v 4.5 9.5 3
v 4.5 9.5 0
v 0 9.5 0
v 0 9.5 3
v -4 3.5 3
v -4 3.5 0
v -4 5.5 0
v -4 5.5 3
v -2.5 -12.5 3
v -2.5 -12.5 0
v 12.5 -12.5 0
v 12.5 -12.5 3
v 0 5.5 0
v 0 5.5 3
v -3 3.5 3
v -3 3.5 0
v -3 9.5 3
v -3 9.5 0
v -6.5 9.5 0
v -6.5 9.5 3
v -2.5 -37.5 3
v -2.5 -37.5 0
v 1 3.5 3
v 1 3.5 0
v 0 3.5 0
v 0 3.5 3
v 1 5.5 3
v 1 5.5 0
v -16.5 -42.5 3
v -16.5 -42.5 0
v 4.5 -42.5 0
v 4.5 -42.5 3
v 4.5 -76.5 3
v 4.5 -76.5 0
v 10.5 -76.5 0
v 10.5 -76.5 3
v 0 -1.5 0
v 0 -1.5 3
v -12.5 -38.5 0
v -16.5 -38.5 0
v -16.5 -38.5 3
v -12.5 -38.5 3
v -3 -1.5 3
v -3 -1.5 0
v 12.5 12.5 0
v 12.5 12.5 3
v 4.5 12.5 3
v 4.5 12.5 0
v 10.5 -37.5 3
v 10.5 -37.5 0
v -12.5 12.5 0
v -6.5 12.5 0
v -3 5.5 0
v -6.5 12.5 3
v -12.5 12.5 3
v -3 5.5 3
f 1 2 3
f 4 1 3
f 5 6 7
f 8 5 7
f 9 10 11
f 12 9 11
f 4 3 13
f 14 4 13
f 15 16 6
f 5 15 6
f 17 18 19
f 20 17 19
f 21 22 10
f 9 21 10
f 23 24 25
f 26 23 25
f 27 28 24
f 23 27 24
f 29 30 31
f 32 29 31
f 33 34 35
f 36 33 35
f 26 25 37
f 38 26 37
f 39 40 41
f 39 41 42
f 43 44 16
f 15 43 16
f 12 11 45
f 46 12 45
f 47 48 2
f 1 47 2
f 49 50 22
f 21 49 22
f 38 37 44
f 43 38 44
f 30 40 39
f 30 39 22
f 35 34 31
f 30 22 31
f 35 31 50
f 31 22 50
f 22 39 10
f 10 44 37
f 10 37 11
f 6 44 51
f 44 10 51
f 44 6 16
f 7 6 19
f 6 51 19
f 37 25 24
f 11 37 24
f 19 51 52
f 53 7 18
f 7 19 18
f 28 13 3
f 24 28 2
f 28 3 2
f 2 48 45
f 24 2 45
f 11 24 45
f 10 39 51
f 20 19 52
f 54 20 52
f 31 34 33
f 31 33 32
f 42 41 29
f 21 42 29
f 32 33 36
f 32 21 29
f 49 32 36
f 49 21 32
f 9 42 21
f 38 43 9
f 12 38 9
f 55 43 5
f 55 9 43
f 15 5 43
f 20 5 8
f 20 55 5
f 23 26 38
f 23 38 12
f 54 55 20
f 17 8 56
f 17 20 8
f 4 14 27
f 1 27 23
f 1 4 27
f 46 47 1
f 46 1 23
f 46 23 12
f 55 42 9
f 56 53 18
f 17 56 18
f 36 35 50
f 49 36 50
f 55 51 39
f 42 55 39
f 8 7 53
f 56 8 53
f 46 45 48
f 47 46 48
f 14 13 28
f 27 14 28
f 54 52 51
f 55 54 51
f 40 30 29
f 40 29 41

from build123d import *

# Parameters (mm, degrees)
F0_W     = 4
F0_H     = 4
F0_W_2   = 6
F0_H_2   = 34
F0_W_3   = 10
F0_H_3   = 25
F1_DEPTH = 3


with BuildPart() as f1:
    # F0 (on Top) → F1 (new body)
    with BuildSketch(Plane.XY):
        with Locations((-14.5, -40.5)):
            Rectangle(F0_W, F0_H)
        with Locations((7.5, -59.5)):
            Rectangle(F0_W_2, F0_H_2)
        with Locations((-7.5, -25)):
            Rectangle(F0_W_3, F0_H_3)
        Polygon((10.5, -37.5), (-2.5, -37.5), (-12.5, -37.5), (-12.5, -38.5), (-12.5, -42.5), (4.5, -42.5), (10.5, -42.5), align=None)
        Polygon((12.5, -12.5), (12.5, 12.5), (4.5, 12.5), (4.5, 9.5), (0, 9.5), (0, 5.5), (1, 5.5), (1, 3.5), (0, 3.5), (0, -1.5), (-3, -1.5), (-3, 3.5), (-4, 3.5), (-4, 5.5), (-3, 5.5), (-3, 9.5), (-6.5, 9.5), (-6.5, 12.5), (-12.5, 12.5), (-12.5, -12.5), (-2.5, -12.5), align=None)
    extrude(amount=F1_DEPTH)


solid = f1.part
